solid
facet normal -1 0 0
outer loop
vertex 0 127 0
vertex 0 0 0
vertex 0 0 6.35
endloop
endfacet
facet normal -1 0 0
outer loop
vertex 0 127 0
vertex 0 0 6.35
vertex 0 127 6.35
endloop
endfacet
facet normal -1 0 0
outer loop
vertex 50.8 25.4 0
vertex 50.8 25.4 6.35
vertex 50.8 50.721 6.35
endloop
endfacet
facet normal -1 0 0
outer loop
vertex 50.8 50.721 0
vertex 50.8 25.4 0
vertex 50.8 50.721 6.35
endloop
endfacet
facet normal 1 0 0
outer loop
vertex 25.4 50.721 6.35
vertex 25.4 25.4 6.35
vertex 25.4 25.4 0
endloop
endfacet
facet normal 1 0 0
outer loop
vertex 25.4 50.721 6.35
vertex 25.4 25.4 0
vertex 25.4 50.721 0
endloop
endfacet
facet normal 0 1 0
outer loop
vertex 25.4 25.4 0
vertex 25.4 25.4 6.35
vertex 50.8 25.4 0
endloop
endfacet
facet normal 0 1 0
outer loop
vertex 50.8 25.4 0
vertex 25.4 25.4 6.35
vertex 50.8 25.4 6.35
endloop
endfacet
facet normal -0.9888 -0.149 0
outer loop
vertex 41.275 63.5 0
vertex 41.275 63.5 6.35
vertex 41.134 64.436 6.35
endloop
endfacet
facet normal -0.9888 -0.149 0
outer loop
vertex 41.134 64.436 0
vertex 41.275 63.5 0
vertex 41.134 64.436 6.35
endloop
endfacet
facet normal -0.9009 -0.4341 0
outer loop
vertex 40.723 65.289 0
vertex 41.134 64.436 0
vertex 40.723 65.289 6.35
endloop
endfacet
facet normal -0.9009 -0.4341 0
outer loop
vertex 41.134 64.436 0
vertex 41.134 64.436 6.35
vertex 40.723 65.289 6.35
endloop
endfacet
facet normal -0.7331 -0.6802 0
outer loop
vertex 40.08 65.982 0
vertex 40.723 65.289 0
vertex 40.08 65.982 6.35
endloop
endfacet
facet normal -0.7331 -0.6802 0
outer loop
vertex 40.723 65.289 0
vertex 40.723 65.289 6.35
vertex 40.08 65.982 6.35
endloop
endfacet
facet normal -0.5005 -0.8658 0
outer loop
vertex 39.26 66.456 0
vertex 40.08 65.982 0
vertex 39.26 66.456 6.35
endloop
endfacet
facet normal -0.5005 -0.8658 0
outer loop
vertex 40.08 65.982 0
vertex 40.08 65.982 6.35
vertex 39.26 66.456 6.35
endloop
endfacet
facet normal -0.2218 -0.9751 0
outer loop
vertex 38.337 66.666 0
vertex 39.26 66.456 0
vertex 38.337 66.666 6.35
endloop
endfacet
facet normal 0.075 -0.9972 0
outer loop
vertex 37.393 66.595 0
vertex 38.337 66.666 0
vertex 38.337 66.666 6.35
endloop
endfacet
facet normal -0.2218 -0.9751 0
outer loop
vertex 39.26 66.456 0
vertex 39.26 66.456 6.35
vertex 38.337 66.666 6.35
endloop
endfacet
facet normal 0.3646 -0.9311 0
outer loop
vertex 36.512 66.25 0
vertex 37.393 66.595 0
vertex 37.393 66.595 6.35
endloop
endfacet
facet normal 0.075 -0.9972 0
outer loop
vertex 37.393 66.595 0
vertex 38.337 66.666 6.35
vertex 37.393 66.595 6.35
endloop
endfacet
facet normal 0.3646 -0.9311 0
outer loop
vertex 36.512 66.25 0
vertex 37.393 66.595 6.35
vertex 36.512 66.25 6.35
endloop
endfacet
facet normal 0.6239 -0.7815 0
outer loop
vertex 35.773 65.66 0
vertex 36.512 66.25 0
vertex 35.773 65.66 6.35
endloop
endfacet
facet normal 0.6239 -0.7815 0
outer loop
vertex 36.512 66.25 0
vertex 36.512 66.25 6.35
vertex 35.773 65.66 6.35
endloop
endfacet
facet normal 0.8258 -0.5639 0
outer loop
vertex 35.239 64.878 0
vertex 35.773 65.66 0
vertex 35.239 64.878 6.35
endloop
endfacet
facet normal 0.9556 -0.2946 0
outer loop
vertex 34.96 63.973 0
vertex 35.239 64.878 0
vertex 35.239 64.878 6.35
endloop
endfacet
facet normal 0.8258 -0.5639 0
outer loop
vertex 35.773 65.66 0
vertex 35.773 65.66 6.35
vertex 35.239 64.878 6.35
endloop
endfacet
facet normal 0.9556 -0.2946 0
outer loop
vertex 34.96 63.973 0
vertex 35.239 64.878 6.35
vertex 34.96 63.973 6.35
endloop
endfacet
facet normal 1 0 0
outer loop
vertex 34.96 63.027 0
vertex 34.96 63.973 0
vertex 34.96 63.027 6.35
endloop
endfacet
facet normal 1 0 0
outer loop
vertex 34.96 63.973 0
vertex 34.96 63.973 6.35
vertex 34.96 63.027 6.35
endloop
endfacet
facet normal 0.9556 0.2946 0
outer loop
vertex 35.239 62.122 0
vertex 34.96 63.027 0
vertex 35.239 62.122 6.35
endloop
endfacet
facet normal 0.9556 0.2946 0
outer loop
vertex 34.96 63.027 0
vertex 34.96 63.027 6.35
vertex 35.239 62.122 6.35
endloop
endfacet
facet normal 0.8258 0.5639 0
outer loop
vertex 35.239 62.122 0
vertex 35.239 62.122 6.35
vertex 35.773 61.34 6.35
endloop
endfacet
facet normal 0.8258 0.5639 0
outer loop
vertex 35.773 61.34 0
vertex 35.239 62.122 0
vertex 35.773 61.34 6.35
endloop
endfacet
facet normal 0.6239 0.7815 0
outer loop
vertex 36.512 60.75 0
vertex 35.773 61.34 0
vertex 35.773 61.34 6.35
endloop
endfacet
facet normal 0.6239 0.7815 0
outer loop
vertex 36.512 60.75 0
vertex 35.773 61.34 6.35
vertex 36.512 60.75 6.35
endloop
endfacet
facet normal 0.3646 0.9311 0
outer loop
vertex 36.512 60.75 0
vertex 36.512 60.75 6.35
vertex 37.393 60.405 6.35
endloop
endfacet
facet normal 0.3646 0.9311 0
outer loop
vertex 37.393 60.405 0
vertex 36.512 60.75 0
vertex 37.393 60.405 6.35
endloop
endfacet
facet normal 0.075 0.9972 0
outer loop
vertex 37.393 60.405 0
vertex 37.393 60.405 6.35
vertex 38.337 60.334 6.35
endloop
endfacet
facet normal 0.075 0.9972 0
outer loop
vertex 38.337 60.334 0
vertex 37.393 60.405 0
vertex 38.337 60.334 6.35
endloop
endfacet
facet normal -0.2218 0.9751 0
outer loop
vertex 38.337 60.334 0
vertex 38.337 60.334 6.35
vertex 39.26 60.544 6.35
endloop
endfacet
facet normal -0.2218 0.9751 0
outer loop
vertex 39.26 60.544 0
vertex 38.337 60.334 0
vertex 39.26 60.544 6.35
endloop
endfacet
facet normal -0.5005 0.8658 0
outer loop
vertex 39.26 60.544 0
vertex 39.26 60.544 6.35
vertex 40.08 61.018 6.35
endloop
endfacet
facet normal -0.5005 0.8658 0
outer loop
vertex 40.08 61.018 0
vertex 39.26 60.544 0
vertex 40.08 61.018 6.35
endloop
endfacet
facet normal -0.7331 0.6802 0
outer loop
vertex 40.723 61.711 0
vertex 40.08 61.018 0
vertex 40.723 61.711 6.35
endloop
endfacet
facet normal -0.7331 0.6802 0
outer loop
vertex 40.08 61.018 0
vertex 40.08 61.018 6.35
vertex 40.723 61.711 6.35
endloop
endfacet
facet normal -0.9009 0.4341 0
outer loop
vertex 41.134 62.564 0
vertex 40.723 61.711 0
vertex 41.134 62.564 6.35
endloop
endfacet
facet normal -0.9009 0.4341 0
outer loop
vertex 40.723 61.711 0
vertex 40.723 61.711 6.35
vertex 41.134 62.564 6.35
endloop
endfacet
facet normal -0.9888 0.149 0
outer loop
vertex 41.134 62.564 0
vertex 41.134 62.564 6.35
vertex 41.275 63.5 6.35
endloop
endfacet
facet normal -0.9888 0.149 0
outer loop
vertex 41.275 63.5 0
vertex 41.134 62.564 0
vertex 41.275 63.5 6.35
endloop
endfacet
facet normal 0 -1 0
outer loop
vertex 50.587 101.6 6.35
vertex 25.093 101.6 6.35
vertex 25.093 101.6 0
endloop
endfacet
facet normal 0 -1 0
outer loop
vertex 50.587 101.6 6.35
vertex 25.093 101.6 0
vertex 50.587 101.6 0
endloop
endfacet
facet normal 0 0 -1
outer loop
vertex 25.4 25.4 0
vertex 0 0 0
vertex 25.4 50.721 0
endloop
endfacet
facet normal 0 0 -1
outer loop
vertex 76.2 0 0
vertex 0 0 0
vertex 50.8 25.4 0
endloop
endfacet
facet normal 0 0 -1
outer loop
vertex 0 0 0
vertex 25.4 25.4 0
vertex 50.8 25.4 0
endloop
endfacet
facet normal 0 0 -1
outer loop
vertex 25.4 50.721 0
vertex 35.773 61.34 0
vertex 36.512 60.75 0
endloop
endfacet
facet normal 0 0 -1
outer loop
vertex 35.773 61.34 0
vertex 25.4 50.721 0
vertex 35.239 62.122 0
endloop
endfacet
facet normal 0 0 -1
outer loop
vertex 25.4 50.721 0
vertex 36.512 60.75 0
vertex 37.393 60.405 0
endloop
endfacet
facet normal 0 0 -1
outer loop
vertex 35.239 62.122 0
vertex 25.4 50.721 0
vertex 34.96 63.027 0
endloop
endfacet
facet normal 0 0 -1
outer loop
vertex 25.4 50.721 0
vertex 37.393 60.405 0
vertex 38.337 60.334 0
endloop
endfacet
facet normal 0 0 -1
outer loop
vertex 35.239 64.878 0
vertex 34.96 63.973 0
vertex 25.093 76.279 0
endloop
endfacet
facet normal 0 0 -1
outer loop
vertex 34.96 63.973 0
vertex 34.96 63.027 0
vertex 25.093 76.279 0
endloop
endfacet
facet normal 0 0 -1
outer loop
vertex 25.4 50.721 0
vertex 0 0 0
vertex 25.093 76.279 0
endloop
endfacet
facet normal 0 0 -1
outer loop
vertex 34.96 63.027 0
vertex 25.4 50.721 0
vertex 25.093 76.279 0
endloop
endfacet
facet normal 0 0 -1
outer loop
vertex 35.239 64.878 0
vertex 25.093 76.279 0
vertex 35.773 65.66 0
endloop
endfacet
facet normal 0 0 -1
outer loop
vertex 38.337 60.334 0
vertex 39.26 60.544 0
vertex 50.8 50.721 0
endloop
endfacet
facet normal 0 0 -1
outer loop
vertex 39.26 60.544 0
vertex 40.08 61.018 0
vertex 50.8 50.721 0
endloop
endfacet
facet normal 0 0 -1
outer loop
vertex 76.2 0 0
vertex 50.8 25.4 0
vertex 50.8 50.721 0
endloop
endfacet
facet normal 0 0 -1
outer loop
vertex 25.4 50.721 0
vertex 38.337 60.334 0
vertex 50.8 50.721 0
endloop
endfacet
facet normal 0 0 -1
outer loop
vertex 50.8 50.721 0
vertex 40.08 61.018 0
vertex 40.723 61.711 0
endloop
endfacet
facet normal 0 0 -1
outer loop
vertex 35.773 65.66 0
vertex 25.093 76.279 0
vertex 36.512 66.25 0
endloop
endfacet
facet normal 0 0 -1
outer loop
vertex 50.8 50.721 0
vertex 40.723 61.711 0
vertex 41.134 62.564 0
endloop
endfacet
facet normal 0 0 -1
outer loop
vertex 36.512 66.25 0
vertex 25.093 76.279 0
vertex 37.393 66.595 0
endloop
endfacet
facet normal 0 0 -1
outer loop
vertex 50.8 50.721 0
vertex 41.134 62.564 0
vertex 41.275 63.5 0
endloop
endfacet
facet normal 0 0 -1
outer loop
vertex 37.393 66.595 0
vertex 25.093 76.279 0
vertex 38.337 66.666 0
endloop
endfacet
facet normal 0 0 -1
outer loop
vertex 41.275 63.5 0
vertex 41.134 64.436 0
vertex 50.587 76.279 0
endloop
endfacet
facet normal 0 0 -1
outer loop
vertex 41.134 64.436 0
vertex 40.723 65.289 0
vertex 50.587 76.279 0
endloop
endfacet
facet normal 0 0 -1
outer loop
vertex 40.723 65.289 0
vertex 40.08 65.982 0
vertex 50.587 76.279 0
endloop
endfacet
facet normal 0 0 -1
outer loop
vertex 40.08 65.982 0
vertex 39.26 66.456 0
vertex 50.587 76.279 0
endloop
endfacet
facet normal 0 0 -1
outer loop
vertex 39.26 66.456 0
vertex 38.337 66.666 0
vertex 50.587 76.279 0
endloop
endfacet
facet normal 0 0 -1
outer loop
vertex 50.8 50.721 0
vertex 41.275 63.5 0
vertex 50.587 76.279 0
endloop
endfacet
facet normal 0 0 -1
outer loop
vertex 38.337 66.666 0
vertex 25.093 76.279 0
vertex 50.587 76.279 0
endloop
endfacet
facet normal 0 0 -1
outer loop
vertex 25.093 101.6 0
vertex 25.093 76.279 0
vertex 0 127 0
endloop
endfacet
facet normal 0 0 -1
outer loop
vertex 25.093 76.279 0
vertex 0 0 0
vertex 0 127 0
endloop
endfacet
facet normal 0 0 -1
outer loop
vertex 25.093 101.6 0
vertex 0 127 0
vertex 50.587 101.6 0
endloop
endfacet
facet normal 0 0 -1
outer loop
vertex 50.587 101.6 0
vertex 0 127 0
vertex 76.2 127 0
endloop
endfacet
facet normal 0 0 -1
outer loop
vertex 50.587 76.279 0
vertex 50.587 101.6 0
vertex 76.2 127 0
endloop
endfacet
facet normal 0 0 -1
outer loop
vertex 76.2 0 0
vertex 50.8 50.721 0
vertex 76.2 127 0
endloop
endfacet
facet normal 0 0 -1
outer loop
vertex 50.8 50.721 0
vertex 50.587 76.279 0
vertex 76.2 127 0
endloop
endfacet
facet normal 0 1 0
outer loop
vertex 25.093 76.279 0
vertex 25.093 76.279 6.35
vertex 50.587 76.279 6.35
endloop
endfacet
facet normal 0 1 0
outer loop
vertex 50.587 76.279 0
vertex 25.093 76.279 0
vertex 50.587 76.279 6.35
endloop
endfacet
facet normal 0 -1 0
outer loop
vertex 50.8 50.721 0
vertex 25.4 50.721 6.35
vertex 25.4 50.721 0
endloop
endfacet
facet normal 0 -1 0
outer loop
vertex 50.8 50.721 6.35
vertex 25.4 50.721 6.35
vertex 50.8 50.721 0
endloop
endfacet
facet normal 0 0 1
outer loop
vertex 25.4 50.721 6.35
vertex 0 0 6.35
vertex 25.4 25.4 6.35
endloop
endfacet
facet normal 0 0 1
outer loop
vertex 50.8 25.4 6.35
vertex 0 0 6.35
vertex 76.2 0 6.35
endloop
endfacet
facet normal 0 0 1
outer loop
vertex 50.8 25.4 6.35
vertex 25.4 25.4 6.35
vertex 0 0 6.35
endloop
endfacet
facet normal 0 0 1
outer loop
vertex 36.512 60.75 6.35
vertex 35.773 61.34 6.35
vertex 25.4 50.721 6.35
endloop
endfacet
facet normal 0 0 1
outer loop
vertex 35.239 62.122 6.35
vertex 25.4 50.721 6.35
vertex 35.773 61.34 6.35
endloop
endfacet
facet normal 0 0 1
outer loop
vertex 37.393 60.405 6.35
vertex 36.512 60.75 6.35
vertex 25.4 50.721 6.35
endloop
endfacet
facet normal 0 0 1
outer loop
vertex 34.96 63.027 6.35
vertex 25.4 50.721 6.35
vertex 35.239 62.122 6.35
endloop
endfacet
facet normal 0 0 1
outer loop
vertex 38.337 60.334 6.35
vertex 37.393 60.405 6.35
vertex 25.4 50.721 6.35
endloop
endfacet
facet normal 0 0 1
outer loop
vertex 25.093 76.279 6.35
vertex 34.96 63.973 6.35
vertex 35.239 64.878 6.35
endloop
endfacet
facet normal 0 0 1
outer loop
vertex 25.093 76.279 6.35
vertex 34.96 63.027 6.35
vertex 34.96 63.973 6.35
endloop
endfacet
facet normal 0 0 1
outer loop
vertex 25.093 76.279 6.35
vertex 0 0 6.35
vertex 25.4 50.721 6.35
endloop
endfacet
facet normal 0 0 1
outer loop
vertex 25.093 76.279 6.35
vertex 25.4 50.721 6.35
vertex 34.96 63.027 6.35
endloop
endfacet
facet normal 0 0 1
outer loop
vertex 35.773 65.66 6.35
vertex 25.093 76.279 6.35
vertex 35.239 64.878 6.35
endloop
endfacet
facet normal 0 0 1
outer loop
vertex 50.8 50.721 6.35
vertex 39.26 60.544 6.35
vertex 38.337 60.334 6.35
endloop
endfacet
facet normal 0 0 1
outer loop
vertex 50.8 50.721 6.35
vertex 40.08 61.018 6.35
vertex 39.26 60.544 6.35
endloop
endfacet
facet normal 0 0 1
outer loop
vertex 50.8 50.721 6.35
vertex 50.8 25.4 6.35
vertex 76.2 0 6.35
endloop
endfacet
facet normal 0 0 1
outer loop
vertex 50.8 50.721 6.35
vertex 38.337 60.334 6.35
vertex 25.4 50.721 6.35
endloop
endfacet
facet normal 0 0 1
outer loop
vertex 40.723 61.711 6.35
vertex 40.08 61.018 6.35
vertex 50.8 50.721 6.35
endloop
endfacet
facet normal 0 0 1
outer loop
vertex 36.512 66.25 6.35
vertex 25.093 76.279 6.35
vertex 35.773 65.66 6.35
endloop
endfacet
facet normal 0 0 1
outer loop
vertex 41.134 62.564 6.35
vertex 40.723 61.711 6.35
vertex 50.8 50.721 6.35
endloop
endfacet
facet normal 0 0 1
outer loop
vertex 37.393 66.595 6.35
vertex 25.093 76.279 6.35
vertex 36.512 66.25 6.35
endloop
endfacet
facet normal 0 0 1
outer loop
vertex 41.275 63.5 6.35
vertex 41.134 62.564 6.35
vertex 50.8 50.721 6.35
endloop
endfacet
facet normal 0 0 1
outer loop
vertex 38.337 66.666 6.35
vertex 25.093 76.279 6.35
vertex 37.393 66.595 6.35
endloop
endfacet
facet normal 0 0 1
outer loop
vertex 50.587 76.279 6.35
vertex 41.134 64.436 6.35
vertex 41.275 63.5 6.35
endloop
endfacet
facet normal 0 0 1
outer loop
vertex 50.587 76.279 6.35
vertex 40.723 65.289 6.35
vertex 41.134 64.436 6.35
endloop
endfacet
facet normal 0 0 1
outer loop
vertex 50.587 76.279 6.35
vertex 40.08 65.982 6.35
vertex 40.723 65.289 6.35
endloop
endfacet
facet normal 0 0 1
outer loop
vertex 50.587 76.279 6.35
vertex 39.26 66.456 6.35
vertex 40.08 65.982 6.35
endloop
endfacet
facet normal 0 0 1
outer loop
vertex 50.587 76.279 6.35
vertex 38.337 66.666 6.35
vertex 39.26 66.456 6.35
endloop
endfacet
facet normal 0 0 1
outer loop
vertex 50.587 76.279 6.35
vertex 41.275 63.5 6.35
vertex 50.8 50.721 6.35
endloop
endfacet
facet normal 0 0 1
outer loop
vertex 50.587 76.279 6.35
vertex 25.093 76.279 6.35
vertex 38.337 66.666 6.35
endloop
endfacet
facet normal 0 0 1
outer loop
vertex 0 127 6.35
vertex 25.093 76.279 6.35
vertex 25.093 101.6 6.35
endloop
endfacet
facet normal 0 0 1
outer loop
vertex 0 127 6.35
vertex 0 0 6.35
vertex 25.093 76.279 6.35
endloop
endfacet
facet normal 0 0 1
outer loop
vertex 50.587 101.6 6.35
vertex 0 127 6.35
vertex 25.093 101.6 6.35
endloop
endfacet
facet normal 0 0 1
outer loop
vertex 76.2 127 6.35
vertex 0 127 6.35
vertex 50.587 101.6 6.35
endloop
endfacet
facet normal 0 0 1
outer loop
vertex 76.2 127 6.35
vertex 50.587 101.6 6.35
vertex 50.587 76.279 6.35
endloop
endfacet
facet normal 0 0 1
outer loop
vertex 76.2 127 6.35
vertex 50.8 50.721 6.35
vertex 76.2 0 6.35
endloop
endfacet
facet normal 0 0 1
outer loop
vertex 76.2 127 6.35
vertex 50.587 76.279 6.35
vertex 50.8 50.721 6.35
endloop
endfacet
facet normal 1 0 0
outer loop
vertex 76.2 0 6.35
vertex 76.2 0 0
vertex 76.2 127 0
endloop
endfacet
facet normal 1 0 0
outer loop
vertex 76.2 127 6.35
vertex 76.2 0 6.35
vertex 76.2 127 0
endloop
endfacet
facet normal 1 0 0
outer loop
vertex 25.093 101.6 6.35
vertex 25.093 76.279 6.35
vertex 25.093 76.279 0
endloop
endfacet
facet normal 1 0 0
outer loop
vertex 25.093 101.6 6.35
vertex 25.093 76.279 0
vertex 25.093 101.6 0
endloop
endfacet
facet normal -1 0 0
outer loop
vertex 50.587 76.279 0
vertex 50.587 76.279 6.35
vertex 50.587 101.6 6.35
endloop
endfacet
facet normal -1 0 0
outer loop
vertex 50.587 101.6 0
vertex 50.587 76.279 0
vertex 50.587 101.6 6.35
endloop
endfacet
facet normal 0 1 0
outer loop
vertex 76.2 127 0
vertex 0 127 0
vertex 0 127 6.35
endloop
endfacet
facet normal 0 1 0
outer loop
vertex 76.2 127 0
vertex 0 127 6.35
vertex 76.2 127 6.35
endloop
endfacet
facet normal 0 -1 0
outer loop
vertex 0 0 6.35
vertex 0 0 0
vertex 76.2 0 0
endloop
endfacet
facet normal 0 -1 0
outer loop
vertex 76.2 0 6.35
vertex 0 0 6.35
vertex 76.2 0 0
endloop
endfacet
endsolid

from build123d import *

# Parameters (mm, degrees)
SKETCH1_W           = 76.2
SKETCH1_H           = 127
BOSS_EXTRUDE1_DEPTH = 6.35
SKETCH3_R           = 3.175
SKETCH3_W           = 25.493937525
SKETCH3_H           = 25.320509378
SKETCH3_W_2         = 25.4
CUT_EXTRUDE2_DEPTH  = 6.35


with BuildPart() as part:
    # Sketch1 → Boss-Extrude1 (new body)
    with BuildSketch(Plane.XY):
        with Locations((38.1, 63.5)):
            Rectangle(SKETCH1_W, SKETCH1_H)
    extrude(amount=BOSS_EXTRUDE1_DEPTH)

    # Sketch3 → Cut-Extrude2 (cut)
    with BuildSketch(Plane.XY.offset(6.35)):
        with Locations((38.1, 63.5)):
            Circle(SKETCH3_R)
        with Locations((37.83985778, 88.939745311)):
            Rectangle(SKETCH3_W, SKETCH3_H)
        with Locations((38.1, 38.060254689)):
            Rectangle(SKETCH3_W_2, SKETCH3_H)
    extrude(amount=-CUT_EXTRUDE2_DEPTH, mode=Mode.SUBTRACT)


solid = part.part
